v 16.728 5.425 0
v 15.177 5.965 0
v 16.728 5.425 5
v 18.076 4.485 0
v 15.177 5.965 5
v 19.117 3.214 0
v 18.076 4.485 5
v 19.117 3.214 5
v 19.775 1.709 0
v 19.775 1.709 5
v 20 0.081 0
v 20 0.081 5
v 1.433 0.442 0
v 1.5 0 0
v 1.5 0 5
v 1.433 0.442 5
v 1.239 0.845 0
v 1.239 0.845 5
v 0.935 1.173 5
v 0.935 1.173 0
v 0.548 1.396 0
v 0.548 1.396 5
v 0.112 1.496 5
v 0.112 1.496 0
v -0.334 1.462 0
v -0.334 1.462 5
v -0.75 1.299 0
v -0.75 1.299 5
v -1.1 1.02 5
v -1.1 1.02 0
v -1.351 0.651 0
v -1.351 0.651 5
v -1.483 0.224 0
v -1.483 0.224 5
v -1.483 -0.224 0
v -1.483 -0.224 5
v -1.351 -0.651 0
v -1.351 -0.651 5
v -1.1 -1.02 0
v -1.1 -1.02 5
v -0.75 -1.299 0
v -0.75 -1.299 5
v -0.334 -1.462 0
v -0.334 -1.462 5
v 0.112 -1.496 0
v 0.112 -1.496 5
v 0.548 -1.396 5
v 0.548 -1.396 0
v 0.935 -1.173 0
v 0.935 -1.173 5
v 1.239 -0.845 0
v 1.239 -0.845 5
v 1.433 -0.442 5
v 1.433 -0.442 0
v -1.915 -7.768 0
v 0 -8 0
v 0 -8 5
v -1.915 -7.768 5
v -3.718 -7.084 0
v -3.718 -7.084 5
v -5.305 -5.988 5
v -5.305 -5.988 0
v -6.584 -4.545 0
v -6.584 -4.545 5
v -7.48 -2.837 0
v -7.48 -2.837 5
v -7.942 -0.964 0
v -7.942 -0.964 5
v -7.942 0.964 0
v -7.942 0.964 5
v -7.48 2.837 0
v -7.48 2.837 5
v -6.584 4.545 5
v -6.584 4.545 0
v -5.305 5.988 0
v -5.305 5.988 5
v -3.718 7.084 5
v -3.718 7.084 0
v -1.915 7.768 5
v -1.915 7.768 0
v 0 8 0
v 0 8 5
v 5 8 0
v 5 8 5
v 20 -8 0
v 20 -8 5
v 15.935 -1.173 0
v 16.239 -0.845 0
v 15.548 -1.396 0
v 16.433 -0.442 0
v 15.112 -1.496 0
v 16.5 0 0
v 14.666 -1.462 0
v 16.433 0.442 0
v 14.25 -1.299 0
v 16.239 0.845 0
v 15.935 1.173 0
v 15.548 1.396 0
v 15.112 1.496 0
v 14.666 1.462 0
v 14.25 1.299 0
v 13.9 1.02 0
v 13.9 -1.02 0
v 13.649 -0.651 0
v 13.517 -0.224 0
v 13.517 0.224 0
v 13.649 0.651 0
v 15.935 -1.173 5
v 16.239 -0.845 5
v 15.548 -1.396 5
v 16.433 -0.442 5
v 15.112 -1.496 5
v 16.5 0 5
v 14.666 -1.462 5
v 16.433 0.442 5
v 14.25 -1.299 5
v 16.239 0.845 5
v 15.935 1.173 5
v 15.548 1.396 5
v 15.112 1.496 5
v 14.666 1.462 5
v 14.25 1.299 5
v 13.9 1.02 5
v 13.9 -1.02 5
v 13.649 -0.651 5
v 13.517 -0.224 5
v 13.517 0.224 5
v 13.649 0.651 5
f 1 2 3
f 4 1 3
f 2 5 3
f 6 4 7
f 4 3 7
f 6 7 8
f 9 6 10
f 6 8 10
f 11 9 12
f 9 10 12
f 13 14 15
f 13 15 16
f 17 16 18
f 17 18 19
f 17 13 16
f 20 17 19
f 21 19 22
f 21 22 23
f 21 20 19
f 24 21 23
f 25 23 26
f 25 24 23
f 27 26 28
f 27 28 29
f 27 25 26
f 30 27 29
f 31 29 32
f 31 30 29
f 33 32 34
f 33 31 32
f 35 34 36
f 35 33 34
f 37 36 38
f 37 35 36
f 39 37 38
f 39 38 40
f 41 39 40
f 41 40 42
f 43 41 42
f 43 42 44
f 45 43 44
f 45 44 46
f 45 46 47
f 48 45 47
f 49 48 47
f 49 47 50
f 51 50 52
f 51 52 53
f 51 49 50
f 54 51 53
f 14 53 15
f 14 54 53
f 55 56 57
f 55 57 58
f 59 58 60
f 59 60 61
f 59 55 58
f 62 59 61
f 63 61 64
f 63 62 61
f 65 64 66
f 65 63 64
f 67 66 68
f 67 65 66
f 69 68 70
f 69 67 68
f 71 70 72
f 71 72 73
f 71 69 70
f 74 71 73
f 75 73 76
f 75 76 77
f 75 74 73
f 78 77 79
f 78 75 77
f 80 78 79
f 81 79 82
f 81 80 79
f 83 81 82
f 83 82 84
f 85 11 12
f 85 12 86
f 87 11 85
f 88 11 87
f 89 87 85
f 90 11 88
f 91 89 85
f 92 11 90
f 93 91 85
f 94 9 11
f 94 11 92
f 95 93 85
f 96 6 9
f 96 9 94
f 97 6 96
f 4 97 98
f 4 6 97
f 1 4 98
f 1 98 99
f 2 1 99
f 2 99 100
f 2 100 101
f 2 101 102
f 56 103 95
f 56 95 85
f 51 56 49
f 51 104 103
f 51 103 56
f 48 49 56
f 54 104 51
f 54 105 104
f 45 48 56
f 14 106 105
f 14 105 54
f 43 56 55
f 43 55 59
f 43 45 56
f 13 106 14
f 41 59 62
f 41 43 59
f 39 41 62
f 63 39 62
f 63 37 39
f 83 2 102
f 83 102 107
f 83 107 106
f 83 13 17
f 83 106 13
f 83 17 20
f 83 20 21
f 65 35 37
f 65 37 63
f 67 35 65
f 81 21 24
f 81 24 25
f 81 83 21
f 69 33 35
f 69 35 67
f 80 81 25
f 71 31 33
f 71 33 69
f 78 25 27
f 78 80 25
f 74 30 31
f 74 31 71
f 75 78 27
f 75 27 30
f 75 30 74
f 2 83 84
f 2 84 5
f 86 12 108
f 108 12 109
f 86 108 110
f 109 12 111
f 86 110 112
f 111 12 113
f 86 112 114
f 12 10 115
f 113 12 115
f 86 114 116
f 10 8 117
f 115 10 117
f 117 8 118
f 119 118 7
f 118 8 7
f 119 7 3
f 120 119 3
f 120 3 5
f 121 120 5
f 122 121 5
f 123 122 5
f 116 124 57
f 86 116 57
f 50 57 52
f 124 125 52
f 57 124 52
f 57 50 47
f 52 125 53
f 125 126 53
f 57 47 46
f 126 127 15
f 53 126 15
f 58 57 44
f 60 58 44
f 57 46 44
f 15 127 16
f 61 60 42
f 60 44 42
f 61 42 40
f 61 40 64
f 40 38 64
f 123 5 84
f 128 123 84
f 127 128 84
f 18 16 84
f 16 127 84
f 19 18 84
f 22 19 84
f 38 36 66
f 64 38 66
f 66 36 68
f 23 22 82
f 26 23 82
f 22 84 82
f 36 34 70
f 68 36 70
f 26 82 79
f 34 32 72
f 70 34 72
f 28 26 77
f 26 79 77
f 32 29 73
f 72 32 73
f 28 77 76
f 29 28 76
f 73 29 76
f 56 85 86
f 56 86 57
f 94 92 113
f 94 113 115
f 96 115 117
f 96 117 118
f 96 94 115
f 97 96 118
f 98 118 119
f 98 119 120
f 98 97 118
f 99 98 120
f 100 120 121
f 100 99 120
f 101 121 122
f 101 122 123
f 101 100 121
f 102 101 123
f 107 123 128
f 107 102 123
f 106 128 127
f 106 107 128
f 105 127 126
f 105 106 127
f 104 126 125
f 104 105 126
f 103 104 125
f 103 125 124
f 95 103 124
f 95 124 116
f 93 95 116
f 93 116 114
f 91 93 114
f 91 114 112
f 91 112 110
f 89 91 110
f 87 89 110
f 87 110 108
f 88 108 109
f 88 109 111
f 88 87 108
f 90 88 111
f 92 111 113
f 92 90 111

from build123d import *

# Parameters (mm, degrees)
ESQUISSE1_R        = 1.5
BOSS_EXTRU_1_DEPTH = 5
CONG_1_R           = 6


with BuildPart() as part:
    # Esquisse1 → Boss.-Extru.1 (new body)
    with BuildSketch(Plane.XY):
        with BuildLine():
            Line((0, 8), (5, 8))
            Line((5, 8), (20, 5))
            Line((20, 5), (20, -8))
            Line((20, -8), (0, -8))
            ThreePointArc((0, -8), (-8, 0), (0, 8))
        make_face()
        Circle(ESQUISSE1_R, mode=Mode.SUBTRACT)
        with Locations((15, 0)):
            Circle(ESQUISSE1_R, mode=Mode.SUBTRACT)
    extrude(amount=BOSS_EXTRU_1_DEPTH)

    # Congé1
    cong_1_edges = [part.edges().sort_by_distance(p)[0] for p in [
        (20, 5, 2.5),
    ]]
    fillet(cong_1_edges, radius=CONG_1_R)


solid = part.part
